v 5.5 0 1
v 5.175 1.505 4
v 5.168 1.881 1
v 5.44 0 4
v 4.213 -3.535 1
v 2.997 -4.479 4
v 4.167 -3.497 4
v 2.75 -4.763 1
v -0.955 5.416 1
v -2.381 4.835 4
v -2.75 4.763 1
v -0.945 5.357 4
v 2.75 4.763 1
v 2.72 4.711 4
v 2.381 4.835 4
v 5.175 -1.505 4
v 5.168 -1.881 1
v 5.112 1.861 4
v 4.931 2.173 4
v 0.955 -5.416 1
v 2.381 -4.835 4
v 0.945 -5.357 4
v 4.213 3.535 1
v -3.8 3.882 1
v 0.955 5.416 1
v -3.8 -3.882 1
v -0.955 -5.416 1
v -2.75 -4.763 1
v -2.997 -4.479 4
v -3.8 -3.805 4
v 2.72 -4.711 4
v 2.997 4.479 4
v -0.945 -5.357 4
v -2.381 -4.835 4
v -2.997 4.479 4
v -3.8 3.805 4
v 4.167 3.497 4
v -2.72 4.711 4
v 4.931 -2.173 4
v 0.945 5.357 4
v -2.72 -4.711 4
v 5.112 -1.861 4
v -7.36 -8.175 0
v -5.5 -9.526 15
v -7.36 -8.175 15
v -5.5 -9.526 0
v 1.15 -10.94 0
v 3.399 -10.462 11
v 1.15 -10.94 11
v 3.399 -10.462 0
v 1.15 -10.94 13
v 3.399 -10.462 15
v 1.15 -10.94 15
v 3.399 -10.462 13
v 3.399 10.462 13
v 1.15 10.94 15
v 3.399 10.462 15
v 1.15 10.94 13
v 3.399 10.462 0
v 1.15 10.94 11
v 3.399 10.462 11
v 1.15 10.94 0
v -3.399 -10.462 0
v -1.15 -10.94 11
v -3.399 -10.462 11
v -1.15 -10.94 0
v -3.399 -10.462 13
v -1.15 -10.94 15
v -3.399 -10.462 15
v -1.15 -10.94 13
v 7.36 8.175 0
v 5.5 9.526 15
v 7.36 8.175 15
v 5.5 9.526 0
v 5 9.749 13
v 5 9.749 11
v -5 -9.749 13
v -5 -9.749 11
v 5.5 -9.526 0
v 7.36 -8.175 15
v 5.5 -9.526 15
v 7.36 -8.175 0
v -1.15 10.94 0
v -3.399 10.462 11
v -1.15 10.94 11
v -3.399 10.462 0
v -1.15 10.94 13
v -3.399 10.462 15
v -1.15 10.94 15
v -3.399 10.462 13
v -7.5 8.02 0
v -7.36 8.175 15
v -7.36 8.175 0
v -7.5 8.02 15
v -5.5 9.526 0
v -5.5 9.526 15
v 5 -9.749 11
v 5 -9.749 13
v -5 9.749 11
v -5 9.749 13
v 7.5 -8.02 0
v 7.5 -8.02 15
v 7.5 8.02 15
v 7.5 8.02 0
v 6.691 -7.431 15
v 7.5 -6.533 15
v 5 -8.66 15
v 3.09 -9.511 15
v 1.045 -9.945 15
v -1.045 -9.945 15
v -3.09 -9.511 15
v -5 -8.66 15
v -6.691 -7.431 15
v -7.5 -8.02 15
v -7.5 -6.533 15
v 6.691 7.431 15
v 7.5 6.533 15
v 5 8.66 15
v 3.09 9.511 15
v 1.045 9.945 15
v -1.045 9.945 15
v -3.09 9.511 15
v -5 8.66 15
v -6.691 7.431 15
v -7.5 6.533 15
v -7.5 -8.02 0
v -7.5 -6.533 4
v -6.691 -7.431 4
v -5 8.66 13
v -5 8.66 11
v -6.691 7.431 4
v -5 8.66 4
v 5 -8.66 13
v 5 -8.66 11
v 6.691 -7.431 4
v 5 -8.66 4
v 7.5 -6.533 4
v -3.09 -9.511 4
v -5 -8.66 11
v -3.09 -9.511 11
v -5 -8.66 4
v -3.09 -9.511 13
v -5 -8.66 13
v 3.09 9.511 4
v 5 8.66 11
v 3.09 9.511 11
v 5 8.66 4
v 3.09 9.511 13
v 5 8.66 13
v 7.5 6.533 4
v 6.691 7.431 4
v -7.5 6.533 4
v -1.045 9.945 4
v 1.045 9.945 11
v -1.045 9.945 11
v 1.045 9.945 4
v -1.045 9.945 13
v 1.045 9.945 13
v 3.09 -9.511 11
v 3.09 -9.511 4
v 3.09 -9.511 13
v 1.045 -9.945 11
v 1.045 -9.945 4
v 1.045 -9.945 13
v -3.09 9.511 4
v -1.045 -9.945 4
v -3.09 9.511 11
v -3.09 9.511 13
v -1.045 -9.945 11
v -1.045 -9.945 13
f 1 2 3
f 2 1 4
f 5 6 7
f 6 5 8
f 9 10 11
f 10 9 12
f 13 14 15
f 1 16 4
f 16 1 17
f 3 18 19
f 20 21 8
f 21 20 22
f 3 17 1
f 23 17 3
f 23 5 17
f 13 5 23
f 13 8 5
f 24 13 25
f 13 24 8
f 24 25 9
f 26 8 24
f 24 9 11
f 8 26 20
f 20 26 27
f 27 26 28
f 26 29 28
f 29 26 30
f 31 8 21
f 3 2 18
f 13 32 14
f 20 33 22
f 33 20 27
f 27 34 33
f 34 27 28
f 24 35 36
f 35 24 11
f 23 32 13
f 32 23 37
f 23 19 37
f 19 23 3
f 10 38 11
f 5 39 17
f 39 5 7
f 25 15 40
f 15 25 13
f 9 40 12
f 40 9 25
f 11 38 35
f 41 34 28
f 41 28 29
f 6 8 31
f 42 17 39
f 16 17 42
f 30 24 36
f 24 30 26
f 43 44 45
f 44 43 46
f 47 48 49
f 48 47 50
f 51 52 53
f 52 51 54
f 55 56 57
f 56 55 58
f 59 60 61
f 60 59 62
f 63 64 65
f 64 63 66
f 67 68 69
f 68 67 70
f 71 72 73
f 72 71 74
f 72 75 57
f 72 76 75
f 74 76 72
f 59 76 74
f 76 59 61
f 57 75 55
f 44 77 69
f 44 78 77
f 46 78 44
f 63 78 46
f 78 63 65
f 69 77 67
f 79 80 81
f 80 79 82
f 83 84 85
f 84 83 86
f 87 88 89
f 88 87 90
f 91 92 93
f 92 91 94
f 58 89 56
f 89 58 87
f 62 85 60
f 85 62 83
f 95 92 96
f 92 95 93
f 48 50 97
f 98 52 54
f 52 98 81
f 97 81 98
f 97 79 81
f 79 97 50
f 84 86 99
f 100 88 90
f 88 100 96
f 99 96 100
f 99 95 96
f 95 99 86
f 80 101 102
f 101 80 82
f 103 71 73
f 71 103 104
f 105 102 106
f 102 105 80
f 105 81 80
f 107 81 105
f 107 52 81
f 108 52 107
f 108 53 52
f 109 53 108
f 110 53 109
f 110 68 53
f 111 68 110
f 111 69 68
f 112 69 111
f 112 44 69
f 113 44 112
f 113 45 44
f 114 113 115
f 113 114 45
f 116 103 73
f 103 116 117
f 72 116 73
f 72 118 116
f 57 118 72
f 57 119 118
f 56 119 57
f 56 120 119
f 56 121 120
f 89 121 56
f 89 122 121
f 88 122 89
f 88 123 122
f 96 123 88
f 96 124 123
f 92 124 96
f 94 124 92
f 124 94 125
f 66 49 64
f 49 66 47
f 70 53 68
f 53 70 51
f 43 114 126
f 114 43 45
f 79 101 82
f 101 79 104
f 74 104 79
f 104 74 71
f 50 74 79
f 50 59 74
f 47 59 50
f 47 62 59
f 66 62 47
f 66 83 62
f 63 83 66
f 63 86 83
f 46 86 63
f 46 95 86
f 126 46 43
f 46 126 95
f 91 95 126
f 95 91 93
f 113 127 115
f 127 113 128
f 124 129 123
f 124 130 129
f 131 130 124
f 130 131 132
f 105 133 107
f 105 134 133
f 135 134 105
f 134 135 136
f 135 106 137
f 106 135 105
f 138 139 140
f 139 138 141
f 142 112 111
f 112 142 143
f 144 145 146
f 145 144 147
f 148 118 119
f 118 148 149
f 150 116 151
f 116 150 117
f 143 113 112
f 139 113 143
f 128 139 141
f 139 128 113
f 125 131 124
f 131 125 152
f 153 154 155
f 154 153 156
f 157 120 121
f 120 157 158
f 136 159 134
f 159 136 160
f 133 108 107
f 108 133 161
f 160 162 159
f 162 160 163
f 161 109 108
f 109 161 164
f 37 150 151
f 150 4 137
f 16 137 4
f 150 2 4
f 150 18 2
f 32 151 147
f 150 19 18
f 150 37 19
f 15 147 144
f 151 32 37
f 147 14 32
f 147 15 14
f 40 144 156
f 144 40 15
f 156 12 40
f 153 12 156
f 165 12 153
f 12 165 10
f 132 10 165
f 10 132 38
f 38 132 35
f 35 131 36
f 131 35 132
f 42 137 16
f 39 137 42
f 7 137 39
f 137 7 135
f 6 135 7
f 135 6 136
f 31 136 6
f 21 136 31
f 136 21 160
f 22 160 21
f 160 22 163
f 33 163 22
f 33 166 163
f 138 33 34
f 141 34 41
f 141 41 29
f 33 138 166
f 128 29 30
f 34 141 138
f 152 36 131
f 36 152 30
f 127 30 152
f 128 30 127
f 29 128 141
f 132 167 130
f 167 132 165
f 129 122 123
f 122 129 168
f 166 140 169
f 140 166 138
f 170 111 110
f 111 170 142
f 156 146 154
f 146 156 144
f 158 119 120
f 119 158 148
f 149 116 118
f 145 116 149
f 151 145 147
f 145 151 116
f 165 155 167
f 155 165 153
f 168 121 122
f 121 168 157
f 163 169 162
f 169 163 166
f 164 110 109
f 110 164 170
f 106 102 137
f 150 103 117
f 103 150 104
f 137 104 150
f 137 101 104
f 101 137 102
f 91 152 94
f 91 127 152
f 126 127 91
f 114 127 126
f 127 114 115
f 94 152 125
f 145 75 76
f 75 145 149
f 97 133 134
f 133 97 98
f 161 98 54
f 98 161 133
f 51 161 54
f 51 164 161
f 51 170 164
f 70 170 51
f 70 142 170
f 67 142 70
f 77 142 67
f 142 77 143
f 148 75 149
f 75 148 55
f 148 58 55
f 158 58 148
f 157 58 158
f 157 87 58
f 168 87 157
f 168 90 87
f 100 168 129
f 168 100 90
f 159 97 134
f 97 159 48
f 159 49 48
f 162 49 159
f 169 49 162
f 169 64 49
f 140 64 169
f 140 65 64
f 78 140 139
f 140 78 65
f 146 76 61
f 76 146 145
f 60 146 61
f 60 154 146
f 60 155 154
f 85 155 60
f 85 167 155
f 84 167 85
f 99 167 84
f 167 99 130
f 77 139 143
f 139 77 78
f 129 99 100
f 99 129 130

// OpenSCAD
module BaseMotorMount(){
    difference(){ 
        cylinder(15, 11,11);
        translate([0,0,4]){
            cylinder(15,10,10);
        }
        translate([0,0,1]){
            difference(){
                cylinder(15, 5.5,5.2);
                rotate([0,0,180]){
                    translate([3.8,-12,-1]){
                        cube([8, 22,20]);
                    }
                }
            }
        }
        translate([7.5,-12,-1]){
            cube([8, 22,20]);
        }
        rotate([0,0,180]){
            translate([7.5,-12,-1]){
                cube([8, 22,20]);
            }
        }
        translate([-5,-50,11]){
            cube([10,100,2]);
        }
    }
}

BaseMotorMount();
